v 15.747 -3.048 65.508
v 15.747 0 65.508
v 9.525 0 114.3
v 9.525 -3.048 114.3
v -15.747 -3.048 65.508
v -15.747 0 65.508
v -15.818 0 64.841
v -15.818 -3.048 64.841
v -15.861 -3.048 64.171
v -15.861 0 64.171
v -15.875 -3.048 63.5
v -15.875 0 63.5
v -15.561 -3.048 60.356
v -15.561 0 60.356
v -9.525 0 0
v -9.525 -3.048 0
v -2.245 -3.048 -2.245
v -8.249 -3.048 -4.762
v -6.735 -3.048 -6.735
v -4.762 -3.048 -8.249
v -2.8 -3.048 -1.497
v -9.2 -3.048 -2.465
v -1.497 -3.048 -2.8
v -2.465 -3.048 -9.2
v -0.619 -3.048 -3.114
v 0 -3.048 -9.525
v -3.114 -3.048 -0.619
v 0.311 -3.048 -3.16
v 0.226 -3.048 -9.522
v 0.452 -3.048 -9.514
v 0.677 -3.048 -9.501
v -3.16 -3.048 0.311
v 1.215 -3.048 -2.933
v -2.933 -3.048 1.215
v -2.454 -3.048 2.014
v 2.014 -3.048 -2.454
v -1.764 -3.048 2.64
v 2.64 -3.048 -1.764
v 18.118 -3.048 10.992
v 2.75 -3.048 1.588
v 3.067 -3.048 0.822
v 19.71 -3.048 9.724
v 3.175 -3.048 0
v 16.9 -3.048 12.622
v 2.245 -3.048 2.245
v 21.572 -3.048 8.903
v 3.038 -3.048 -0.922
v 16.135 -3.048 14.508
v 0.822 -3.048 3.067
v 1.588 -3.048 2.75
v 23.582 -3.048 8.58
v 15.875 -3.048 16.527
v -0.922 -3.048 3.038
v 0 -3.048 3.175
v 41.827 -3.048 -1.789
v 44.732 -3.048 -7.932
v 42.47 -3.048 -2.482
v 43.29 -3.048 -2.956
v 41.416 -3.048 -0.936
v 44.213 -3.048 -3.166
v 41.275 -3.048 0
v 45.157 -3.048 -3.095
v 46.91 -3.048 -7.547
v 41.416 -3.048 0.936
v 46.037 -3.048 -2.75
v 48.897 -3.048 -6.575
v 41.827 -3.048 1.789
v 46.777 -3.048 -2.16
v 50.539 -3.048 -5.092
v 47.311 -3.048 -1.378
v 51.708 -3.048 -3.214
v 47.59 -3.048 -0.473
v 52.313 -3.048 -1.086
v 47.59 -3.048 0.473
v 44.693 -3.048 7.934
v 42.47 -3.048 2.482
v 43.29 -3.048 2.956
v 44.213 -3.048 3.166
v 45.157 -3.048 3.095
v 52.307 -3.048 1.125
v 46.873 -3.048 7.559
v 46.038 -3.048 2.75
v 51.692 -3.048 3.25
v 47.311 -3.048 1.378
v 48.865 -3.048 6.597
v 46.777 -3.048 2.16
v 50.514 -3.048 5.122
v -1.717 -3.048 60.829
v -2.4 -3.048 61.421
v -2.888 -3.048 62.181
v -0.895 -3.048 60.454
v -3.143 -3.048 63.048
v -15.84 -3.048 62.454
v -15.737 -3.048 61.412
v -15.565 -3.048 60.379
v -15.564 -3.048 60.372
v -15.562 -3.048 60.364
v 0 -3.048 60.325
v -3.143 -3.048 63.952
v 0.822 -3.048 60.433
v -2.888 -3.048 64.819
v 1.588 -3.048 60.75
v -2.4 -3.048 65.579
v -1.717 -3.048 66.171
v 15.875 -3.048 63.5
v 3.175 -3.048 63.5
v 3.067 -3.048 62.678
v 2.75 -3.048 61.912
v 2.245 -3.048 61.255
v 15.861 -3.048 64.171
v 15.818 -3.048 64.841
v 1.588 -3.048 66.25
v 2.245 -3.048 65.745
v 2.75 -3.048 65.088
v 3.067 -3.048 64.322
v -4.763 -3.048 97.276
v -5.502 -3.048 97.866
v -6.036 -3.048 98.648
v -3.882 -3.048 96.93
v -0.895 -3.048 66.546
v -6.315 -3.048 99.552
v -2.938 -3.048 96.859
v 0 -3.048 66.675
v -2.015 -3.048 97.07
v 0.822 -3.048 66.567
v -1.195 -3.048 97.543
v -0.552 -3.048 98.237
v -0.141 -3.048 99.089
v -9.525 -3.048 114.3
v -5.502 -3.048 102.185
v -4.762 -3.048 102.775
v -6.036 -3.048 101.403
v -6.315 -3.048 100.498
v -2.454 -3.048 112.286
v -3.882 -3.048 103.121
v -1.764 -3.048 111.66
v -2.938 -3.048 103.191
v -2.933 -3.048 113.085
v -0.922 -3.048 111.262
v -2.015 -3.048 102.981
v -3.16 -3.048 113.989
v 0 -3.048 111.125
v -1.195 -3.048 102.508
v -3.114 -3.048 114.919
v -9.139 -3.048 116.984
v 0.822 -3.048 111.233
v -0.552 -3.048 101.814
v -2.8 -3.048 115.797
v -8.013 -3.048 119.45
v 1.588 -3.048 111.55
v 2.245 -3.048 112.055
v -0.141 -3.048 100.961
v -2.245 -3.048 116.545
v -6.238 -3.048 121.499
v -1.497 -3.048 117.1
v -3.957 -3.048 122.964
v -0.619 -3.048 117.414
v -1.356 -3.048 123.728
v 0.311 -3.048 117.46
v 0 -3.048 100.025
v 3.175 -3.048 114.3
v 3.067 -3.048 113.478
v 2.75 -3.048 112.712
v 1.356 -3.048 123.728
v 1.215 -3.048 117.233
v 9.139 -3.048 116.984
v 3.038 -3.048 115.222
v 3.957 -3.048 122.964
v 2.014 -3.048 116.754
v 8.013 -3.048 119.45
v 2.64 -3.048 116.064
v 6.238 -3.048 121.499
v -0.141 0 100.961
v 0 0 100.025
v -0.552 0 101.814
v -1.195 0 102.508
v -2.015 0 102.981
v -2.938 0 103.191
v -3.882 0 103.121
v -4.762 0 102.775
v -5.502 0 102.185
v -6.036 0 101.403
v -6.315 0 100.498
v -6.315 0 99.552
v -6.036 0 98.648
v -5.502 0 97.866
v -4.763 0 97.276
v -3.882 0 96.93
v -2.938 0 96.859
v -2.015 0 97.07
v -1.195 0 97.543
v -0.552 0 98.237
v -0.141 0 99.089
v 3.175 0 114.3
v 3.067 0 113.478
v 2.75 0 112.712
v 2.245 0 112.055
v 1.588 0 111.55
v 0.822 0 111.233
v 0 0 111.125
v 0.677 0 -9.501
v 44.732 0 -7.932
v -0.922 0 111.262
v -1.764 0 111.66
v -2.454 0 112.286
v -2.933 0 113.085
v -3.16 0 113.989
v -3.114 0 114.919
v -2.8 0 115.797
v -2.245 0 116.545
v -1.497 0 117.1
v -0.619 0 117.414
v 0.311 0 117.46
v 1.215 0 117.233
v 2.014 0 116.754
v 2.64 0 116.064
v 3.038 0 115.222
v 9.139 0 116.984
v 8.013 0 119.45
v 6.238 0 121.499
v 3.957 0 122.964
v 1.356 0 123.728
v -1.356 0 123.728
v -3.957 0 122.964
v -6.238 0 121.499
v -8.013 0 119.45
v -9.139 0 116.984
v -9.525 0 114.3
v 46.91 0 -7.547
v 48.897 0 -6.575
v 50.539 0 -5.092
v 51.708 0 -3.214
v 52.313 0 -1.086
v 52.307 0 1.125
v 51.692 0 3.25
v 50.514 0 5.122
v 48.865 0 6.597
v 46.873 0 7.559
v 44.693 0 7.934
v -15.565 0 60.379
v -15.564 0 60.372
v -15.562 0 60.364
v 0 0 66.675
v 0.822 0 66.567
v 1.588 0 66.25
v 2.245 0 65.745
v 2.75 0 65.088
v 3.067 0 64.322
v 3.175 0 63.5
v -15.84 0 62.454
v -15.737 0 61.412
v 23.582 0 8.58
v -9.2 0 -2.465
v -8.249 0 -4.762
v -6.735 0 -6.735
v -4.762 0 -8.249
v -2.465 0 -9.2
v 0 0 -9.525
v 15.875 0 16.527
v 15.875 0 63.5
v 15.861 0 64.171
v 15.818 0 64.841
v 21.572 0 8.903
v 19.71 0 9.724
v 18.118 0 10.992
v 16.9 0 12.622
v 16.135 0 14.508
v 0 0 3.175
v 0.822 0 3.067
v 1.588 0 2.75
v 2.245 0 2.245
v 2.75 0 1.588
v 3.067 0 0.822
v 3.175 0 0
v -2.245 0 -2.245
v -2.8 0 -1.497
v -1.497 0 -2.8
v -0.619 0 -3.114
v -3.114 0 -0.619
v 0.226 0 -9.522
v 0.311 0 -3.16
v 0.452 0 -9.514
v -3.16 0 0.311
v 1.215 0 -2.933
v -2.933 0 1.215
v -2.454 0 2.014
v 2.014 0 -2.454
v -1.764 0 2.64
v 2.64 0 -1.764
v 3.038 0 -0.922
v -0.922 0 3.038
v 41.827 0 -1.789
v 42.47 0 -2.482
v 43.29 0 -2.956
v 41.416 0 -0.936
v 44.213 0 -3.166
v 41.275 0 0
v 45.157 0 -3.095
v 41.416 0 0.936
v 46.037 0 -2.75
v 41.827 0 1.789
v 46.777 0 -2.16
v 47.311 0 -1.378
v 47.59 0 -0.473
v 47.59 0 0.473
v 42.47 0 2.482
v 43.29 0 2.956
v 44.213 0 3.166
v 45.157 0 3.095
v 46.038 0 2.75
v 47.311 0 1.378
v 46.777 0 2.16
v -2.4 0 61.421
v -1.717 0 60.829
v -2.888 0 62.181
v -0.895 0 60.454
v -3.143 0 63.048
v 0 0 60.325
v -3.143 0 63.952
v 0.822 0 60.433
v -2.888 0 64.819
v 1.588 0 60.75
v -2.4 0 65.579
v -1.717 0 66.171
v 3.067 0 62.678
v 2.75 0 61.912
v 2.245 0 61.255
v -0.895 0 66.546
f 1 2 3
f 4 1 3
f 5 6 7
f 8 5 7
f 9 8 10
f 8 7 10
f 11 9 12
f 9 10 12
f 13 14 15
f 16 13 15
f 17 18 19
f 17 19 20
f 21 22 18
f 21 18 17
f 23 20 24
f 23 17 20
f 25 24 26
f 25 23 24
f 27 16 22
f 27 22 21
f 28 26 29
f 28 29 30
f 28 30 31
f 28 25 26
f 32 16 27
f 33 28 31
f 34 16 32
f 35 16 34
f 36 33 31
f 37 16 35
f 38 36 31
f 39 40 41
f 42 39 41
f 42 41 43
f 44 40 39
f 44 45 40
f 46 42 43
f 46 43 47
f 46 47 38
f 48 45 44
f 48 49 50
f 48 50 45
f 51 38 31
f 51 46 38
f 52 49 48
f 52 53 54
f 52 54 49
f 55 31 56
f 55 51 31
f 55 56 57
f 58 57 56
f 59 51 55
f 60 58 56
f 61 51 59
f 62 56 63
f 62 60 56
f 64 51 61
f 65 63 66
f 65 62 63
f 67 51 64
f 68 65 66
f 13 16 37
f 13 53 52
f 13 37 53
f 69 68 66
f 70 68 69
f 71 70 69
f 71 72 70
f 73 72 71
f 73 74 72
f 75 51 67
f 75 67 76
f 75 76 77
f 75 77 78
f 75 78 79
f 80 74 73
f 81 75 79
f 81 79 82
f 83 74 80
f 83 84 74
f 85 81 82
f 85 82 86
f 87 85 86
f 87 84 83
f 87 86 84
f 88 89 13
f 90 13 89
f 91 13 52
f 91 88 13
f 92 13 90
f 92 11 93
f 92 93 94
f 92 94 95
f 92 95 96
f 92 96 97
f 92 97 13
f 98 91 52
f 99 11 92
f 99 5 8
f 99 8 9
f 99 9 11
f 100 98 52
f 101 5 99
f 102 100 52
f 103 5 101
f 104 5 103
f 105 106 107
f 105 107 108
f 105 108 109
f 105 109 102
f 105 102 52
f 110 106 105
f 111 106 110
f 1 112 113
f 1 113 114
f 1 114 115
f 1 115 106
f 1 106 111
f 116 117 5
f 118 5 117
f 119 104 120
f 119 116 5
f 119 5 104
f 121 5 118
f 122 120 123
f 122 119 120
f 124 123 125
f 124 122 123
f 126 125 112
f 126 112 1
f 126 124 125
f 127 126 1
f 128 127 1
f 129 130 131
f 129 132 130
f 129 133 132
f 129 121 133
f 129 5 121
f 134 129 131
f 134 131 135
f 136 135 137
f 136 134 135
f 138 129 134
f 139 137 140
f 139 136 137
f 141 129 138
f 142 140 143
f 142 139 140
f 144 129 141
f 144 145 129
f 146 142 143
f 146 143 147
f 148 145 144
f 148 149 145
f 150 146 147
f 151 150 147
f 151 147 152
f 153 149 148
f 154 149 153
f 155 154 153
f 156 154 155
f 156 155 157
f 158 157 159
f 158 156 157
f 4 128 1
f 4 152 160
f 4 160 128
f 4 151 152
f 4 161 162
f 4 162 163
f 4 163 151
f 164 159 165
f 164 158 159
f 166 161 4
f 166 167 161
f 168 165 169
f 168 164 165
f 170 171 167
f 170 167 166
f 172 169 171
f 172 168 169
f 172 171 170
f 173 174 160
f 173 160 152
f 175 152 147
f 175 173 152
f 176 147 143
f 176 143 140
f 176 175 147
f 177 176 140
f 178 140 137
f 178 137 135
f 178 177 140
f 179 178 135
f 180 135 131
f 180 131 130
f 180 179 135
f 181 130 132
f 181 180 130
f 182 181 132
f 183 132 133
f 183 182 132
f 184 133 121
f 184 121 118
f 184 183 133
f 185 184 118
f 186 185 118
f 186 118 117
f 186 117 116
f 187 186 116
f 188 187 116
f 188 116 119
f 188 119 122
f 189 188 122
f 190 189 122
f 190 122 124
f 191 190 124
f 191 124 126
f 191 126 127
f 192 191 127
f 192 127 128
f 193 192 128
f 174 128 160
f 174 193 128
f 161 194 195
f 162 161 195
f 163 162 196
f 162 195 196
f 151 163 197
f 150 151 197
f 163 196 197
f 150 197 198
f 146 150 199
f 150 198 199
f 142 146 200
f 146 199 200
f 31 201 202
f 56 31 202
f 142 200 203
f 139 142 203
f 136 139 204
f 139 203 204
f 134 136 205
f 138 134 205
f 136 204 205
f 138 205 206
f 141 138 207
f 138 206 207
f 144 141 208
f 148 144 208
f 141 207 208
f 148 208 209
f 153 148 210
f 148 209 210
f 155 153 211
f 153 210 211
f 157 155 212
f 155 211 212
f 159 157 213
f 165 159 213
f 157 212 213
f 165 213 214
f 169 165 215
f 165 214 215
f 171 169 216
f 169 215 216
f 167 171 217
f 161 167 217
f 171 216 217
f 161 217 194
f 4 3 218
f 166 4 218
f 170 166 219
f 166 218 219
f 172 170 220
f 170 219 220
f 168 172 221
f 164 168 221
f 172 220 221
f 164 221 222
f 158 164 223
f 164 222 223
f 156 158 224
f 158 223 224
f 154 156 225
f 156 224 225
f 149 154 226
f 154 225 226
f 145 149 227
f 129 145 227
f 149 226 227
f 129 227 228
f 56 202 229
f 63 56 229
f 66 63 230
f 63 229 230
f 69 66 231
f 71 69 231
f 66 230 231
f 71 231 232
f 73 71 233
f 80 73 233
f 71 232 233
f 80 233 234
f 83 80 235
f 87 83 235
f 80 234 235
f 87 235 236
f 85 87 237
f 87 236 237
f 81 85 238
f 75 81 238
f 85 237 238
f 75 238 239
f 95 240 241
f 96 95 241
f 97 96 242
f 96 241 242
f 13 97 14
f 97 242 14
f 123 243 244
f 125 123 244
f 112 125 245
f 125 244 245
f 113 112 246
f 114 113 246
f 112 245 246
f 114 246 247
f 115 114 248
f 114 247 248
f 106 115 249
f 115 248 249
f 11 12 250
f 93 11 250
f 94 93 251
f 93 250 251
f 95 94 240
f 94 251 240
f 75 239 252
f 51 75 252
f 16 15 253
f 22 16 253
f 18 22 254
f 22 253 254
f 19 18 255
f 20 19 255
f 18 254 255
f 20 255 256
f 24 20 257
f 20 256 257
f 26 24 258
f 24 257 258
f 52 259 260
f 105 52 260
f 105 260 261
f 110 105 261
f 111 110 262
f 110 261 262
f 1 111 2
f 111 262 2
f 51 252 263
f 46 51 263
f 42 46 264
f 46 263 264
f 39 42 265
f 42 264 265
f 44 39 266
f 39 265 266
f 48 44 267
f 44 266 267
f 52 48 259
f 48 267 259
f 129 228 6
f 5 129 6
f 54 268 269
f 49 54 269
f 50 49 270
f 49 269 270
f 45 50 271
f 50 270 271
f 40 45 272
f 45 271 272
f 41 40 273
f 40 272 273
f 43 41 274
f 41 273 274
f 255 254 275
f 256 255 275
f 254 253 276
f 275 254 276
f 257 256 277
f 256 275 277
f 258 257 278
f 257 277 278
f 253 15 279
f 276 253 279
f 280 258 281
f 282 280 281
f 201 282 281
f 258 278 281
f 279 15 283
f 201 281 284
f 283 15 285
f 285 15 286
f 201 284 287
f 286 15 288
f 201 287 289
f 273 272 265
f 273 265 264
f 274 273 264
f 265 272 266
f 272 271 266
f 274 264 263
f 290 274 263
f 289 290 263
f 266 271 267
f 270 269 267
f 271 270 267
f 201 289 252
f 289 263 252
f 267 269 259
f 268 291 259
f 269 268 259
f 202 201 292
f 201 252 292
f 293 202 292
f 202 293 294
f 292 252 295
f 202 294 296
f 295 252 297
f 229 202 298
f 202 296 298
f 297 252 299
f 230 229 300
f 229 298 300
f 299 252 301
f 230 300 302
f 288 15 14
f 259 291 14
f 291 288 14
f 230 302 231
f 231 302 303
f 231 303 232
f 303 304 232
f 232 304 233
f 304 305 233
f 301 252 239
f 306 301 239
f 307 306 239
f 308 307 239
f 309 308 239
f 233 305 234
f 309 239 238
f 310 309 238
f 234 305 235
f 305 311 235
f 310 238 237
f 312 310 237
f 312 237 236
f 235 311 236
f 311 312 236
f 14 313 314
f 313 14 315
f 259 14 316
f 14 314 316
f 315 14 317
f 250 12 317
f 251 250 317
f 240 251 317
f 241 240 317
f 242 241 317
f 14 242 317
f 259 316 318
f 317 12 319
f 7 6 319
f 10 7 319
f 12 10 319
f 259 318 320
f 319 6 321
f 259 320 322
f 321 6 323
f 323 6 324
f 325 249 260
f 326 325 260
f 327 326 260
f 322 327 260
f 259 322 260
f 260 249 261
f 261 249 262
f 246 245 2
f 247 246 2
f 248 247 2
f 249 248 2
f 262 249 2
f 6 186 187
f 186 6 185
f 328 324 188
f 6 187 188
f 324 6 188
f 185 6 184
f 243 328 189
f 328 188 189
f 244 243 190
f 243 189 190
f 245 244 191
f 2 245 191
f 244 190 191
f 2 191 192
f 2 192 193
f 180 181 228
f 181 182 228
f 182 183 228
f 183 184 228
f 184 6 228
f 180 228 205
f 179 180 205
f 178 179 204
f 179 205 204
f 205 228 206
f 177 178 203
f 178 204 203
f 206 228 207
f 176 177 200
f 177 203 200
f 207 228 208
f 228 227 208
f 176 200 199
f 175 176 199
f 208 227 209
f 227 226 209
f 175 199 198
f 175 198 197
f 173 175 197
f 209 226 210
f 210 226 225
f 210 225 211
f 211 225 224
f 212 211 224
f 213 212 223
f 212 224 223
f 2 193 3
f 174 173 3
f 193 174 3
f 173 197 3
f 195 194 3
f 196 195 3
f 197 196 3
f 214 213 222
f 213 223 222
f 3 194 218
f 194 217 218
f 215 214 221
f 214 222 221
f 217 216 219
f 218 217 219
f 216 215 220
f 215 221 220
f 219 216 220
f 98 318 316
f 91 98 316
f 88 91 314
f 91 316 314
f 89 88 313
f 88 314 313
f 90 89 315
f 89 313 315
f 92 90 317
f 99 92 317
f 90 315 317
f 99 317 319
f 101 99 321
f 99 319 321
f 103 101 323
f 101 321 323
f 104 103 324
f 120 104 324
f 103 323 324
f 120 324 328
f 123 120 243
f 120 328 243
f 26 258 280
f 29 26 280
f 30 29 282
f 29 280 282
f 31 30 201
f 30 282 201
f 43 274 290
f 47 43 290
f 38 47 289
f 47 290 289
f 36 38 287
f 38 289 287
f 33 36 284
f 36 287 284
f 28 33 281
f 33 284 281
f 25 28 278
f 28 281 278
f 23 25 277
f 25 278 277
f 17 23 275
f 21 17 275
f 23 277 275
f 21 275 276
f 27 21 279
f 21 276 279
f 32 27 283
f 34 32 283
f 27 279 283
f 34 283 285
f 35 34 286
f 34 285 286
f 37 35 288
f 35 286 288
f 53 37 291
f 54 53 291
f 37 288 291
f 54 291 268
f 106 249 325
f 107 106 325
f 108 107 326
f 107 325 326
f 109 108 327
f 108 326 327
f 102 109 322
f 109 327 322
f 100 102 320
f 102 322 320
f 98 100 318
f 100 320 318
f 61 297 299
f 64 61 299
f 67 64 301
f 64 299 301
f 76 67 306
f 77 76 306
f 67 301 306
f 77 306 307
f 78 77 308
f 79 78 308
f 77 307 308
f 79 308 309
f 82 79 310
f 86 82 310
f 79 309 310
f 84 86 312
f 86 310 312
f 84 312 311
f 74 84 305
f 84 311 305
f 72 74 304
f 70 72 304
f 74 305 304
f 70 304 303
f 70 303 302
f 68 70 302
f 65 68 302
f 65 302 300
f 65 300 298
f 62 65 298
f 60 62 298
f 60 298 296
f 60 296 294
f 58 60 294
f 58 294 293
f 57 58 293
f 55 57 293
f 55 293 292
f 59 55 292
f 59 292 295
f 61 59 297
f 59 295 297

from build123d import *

# Parameters (mm, degrees)
F0_R     = 3.175
F1_DEPTH = 3.048


with BuildPart() as f1:
    # F0 (on Front) → F1 (new body)
    with BuildSketch(Plane.XZ):
        with BuildLine():
            ThreePointArc((3.175, 0), (-2.2450640303, -2.2450640303), (0, 3.175))
            Line((0, 3.175), (0, 9.525))
            ThreePointArc((0, 9.525), (-6.7351920908, 6.7351920908), (-9.525, 0))
            ThreePointArc((-9.525, 0), (-6.7351920908, -6.7351920908), (0, -9.525))
            Line((0, -9.525), (0.6773435479, -9.500885786))
            ThreePointArc((0.6773435479, -9.500885786), (6.9705567315, -6.4912990883), (9.525, 0))
            Line((9.525, 0), (3.175, 0))
        make_face()
        with BuildLine():
            ThreePointArc((-9.525, 0), (-6.7351920908, 6.7351920908), (0, 9.525))
            Line((0, 9.525), (0, 47.625))
            ThreePointArc((0, 47.625), (-10.0526499203, 51.2134278751), (-15.5606435644, 60.3564356436))
            Line((-15.5606435644, 60.3564356436), (-9.525, 0))
        make_face()
        with BuildLine():
            Line((0, 47.625), (0, 9.525))
            ThreePointArc((0, 9.525), (6.7351920908, 6.7351920908), (9.525, 0))
            Line((9.525, 0), (36.5125, 0))
            ThreePointArc((36.5125, 0), (38.9239306999, 5.6979350945), (44.6930264481, 7.9337786959))
            Line((44.6930264481, 7.9337786959), (23.5817847096, 8.5804554297))
            ThreePointArc((23.5817847096, 8.5804554297), (18.1181482094, 10.9920171606), (15.875, 16.5269281715))
            Line((15.875, 16.5269281715), (15.875, 63.5))
            ThreePointArc((15.875, 63.5), (11.2253201513, 52.2746798487), (0, 47.625))
        make_face()
        with BuildLine():
            Line((36.5125, 0), (9.525, 0))
            ThreePointArc((9.525, 0), (6.9705567315, -6.4912990883), (0.6773435479, -9.500885786))
            Line((0.6773435479, -9.500885786), (44.7324052746, -7.9324746146))
            ThreePointArc((44.7324052746, -7.9324746146), (38.9380895153, -5.7116327839), (36.5125, 0))
        make_face()
        with BuildLine():
            ThreePointArc((-15.5606435644, 60.3564356436), (-10.0526499203, 51.2134278751), (0, 47.625))
            Line((0, 47.625), (0, 60.325))
            ThreePointArc((0, 60.325), (-3.175, 63.5), (0, 66.675))
            Line((0, 66.675), (0, 79.375))
            ThreePointArc((0, 79.375), (-10.4912828548, 75.4142187767), (-15.7474569047, 65.5082893304))
            ThreePointArc((-15.7474569047, 65.5082893304), (-15.8430821396, 64.5061676396), (-15.875, 63.5))
            Line((-15.875, 63.5), (-15.5606435644, 60.3564356436))
        make_face()
        with BuildLine():
            Line((0, 60.325), (0, 47.625))
            ThreePointArc((0, 47.625), (11.2253201513, 52.2746798487), (15.875, 63.5))
            ThreePointArc((15.875, 63.5), (15.8430821396, 64.5061676396), (15.7474569047, 65.5082893304))
            ThreePointArc((15.7474569047, 65.5082893304), (10.4912828548, 75.4142187767), (0, 79.375))
            Line((0, 79.375), (0, 66.675))
            ThreePointArc((0, 66.675), (2.2450640303, 65.7450640303), (3.175, 63.5))
            ThreePointArc((3.175, 63.5), (2.2450640303, 61.2549359697), (0, 60.325))
        make_face()
        with BuildLine():
            ThreePointArc((44.6930264481, 7.9337786959), (38.9239306999, 5.6979350945), (36.5125, 0))
            ThreePointArc((36.5125, 0), (38.9380895153, -5.7116327839), (44.7324052746, -7.9324746146))
            ThreePointArc((44.7324052746, -7.9324746146), (50.1616327839, -5.5119104847), (52.3875, 0))
            ThreePointArc((52.3875, 0), (50.1479350945, 5.5260693001), (44.6930264481, 7.9337786959))
        make_face()
        with BuildLine():
            ThreePointArc((47.625, 0), (44.45, -3.175), (41.275, 0))
            ThreePointArc((41.275, 0), (44.45, 3.175), (47.625, 0))
        make_face(mode=Mode.SUBTRACT)
        with BuildLine():
            ThreePointArc((0, -9.525), (0.3388863295, -9.5189695375), (0.6773435479, -9.500885786))
            Line((0.6773435479, -9.500885786), (0, -9.525))
        make_face()
        with BuildLine():
            ThreePointArc((-15.5652161214, 60.3791552277), (-15.5629339888, 60.3677946012), (-15.5606435644, 60.3564356436))
            Line((-15.5606435644, 60.3564356436), (-15.875, 63.5))
            Line((-15.875, 63.5), (-15.5652161214, 60.3791552277))
        make_face()
        with BuildLine():
            ThreePointArc((-15.875, 63.5), (-15.7973641936, 61.9319089516), (-15.5652161214, 60.3791552277))
            Line((-15.5652161214, 60.3791552277), (-15.875, 63.5))
        make_face()
        with BuildLine():
            ThreePointArc((0, 79.375), (10.4912828548, 75.4142187767), (15.7474569047, 65.5082893304))
            Line((15.7474569047, 65.5082893304), (9.525, 114.3))
            ThreePointArc((9.525, 114.3), (6.7351920908, 107.5648079092), (0, 104.775))
            Line((0, 104.775), (0, 100.0252))
            Line((0, 100.0252), (0, 79.375))
        make_face()
        with BuildLine():
            ThreePointArc((-15.7474569047, 65.5082893304), (-10.4912828548, 75.4142187767), (0, 79.375))
            Line((0, 79.375), (0, 100.0252))
            Line((0, 100.0252), (0, 104.775))
            ThreePointArc((0, 104.775), (-6.7351920908, 107.5648079092), (-9.525, 114.3))
            Line((-9.525, 114.3), (-15.7474569047, 65.5082893304))
        make_face()
        with Locations((-3.175, 100.0252)):
            Circle(F0_R, mode=Mode.SUBTRACT)
        with BuildLine():
            ThreePointArc((0, 104.775), (6.7351920908, 107.5648079092), (9.525, 114.3))
            ThreePointArc((9.525, 114.3), (0, 123.825), (-9.525, 114.3))
            ThreePointArc((-9.525, 114.3), (-6.7351920908, 107.5648079092), (0, 104.775))
        make_face()
        with BuildLine():
            ThreePointArc((3.175, 114.3), (2.2450640303, 112.0549359697), (0, 111.125))
            ThreePointArc((0, 111.125), (-2.2450640303, 116.5450640303), (3.175, 114.3))
        make_face(mode=Mode.SUBTRACT)
        with BuildLine():
            Line((0, 9.525), (0, 3.175))
            ThreePointArc((0, 3.175), (2.2450640303, 2.2450640303), (3.175, 0))
            Line((3.175, 0), (9.525, 0))
            ThreePointArc((9.525, 0), (6.7351920908, 6.7351920908), (0, 9.525))
        make_face()
    extrude(amount=F1_DEPTH)


solid = f1.part
